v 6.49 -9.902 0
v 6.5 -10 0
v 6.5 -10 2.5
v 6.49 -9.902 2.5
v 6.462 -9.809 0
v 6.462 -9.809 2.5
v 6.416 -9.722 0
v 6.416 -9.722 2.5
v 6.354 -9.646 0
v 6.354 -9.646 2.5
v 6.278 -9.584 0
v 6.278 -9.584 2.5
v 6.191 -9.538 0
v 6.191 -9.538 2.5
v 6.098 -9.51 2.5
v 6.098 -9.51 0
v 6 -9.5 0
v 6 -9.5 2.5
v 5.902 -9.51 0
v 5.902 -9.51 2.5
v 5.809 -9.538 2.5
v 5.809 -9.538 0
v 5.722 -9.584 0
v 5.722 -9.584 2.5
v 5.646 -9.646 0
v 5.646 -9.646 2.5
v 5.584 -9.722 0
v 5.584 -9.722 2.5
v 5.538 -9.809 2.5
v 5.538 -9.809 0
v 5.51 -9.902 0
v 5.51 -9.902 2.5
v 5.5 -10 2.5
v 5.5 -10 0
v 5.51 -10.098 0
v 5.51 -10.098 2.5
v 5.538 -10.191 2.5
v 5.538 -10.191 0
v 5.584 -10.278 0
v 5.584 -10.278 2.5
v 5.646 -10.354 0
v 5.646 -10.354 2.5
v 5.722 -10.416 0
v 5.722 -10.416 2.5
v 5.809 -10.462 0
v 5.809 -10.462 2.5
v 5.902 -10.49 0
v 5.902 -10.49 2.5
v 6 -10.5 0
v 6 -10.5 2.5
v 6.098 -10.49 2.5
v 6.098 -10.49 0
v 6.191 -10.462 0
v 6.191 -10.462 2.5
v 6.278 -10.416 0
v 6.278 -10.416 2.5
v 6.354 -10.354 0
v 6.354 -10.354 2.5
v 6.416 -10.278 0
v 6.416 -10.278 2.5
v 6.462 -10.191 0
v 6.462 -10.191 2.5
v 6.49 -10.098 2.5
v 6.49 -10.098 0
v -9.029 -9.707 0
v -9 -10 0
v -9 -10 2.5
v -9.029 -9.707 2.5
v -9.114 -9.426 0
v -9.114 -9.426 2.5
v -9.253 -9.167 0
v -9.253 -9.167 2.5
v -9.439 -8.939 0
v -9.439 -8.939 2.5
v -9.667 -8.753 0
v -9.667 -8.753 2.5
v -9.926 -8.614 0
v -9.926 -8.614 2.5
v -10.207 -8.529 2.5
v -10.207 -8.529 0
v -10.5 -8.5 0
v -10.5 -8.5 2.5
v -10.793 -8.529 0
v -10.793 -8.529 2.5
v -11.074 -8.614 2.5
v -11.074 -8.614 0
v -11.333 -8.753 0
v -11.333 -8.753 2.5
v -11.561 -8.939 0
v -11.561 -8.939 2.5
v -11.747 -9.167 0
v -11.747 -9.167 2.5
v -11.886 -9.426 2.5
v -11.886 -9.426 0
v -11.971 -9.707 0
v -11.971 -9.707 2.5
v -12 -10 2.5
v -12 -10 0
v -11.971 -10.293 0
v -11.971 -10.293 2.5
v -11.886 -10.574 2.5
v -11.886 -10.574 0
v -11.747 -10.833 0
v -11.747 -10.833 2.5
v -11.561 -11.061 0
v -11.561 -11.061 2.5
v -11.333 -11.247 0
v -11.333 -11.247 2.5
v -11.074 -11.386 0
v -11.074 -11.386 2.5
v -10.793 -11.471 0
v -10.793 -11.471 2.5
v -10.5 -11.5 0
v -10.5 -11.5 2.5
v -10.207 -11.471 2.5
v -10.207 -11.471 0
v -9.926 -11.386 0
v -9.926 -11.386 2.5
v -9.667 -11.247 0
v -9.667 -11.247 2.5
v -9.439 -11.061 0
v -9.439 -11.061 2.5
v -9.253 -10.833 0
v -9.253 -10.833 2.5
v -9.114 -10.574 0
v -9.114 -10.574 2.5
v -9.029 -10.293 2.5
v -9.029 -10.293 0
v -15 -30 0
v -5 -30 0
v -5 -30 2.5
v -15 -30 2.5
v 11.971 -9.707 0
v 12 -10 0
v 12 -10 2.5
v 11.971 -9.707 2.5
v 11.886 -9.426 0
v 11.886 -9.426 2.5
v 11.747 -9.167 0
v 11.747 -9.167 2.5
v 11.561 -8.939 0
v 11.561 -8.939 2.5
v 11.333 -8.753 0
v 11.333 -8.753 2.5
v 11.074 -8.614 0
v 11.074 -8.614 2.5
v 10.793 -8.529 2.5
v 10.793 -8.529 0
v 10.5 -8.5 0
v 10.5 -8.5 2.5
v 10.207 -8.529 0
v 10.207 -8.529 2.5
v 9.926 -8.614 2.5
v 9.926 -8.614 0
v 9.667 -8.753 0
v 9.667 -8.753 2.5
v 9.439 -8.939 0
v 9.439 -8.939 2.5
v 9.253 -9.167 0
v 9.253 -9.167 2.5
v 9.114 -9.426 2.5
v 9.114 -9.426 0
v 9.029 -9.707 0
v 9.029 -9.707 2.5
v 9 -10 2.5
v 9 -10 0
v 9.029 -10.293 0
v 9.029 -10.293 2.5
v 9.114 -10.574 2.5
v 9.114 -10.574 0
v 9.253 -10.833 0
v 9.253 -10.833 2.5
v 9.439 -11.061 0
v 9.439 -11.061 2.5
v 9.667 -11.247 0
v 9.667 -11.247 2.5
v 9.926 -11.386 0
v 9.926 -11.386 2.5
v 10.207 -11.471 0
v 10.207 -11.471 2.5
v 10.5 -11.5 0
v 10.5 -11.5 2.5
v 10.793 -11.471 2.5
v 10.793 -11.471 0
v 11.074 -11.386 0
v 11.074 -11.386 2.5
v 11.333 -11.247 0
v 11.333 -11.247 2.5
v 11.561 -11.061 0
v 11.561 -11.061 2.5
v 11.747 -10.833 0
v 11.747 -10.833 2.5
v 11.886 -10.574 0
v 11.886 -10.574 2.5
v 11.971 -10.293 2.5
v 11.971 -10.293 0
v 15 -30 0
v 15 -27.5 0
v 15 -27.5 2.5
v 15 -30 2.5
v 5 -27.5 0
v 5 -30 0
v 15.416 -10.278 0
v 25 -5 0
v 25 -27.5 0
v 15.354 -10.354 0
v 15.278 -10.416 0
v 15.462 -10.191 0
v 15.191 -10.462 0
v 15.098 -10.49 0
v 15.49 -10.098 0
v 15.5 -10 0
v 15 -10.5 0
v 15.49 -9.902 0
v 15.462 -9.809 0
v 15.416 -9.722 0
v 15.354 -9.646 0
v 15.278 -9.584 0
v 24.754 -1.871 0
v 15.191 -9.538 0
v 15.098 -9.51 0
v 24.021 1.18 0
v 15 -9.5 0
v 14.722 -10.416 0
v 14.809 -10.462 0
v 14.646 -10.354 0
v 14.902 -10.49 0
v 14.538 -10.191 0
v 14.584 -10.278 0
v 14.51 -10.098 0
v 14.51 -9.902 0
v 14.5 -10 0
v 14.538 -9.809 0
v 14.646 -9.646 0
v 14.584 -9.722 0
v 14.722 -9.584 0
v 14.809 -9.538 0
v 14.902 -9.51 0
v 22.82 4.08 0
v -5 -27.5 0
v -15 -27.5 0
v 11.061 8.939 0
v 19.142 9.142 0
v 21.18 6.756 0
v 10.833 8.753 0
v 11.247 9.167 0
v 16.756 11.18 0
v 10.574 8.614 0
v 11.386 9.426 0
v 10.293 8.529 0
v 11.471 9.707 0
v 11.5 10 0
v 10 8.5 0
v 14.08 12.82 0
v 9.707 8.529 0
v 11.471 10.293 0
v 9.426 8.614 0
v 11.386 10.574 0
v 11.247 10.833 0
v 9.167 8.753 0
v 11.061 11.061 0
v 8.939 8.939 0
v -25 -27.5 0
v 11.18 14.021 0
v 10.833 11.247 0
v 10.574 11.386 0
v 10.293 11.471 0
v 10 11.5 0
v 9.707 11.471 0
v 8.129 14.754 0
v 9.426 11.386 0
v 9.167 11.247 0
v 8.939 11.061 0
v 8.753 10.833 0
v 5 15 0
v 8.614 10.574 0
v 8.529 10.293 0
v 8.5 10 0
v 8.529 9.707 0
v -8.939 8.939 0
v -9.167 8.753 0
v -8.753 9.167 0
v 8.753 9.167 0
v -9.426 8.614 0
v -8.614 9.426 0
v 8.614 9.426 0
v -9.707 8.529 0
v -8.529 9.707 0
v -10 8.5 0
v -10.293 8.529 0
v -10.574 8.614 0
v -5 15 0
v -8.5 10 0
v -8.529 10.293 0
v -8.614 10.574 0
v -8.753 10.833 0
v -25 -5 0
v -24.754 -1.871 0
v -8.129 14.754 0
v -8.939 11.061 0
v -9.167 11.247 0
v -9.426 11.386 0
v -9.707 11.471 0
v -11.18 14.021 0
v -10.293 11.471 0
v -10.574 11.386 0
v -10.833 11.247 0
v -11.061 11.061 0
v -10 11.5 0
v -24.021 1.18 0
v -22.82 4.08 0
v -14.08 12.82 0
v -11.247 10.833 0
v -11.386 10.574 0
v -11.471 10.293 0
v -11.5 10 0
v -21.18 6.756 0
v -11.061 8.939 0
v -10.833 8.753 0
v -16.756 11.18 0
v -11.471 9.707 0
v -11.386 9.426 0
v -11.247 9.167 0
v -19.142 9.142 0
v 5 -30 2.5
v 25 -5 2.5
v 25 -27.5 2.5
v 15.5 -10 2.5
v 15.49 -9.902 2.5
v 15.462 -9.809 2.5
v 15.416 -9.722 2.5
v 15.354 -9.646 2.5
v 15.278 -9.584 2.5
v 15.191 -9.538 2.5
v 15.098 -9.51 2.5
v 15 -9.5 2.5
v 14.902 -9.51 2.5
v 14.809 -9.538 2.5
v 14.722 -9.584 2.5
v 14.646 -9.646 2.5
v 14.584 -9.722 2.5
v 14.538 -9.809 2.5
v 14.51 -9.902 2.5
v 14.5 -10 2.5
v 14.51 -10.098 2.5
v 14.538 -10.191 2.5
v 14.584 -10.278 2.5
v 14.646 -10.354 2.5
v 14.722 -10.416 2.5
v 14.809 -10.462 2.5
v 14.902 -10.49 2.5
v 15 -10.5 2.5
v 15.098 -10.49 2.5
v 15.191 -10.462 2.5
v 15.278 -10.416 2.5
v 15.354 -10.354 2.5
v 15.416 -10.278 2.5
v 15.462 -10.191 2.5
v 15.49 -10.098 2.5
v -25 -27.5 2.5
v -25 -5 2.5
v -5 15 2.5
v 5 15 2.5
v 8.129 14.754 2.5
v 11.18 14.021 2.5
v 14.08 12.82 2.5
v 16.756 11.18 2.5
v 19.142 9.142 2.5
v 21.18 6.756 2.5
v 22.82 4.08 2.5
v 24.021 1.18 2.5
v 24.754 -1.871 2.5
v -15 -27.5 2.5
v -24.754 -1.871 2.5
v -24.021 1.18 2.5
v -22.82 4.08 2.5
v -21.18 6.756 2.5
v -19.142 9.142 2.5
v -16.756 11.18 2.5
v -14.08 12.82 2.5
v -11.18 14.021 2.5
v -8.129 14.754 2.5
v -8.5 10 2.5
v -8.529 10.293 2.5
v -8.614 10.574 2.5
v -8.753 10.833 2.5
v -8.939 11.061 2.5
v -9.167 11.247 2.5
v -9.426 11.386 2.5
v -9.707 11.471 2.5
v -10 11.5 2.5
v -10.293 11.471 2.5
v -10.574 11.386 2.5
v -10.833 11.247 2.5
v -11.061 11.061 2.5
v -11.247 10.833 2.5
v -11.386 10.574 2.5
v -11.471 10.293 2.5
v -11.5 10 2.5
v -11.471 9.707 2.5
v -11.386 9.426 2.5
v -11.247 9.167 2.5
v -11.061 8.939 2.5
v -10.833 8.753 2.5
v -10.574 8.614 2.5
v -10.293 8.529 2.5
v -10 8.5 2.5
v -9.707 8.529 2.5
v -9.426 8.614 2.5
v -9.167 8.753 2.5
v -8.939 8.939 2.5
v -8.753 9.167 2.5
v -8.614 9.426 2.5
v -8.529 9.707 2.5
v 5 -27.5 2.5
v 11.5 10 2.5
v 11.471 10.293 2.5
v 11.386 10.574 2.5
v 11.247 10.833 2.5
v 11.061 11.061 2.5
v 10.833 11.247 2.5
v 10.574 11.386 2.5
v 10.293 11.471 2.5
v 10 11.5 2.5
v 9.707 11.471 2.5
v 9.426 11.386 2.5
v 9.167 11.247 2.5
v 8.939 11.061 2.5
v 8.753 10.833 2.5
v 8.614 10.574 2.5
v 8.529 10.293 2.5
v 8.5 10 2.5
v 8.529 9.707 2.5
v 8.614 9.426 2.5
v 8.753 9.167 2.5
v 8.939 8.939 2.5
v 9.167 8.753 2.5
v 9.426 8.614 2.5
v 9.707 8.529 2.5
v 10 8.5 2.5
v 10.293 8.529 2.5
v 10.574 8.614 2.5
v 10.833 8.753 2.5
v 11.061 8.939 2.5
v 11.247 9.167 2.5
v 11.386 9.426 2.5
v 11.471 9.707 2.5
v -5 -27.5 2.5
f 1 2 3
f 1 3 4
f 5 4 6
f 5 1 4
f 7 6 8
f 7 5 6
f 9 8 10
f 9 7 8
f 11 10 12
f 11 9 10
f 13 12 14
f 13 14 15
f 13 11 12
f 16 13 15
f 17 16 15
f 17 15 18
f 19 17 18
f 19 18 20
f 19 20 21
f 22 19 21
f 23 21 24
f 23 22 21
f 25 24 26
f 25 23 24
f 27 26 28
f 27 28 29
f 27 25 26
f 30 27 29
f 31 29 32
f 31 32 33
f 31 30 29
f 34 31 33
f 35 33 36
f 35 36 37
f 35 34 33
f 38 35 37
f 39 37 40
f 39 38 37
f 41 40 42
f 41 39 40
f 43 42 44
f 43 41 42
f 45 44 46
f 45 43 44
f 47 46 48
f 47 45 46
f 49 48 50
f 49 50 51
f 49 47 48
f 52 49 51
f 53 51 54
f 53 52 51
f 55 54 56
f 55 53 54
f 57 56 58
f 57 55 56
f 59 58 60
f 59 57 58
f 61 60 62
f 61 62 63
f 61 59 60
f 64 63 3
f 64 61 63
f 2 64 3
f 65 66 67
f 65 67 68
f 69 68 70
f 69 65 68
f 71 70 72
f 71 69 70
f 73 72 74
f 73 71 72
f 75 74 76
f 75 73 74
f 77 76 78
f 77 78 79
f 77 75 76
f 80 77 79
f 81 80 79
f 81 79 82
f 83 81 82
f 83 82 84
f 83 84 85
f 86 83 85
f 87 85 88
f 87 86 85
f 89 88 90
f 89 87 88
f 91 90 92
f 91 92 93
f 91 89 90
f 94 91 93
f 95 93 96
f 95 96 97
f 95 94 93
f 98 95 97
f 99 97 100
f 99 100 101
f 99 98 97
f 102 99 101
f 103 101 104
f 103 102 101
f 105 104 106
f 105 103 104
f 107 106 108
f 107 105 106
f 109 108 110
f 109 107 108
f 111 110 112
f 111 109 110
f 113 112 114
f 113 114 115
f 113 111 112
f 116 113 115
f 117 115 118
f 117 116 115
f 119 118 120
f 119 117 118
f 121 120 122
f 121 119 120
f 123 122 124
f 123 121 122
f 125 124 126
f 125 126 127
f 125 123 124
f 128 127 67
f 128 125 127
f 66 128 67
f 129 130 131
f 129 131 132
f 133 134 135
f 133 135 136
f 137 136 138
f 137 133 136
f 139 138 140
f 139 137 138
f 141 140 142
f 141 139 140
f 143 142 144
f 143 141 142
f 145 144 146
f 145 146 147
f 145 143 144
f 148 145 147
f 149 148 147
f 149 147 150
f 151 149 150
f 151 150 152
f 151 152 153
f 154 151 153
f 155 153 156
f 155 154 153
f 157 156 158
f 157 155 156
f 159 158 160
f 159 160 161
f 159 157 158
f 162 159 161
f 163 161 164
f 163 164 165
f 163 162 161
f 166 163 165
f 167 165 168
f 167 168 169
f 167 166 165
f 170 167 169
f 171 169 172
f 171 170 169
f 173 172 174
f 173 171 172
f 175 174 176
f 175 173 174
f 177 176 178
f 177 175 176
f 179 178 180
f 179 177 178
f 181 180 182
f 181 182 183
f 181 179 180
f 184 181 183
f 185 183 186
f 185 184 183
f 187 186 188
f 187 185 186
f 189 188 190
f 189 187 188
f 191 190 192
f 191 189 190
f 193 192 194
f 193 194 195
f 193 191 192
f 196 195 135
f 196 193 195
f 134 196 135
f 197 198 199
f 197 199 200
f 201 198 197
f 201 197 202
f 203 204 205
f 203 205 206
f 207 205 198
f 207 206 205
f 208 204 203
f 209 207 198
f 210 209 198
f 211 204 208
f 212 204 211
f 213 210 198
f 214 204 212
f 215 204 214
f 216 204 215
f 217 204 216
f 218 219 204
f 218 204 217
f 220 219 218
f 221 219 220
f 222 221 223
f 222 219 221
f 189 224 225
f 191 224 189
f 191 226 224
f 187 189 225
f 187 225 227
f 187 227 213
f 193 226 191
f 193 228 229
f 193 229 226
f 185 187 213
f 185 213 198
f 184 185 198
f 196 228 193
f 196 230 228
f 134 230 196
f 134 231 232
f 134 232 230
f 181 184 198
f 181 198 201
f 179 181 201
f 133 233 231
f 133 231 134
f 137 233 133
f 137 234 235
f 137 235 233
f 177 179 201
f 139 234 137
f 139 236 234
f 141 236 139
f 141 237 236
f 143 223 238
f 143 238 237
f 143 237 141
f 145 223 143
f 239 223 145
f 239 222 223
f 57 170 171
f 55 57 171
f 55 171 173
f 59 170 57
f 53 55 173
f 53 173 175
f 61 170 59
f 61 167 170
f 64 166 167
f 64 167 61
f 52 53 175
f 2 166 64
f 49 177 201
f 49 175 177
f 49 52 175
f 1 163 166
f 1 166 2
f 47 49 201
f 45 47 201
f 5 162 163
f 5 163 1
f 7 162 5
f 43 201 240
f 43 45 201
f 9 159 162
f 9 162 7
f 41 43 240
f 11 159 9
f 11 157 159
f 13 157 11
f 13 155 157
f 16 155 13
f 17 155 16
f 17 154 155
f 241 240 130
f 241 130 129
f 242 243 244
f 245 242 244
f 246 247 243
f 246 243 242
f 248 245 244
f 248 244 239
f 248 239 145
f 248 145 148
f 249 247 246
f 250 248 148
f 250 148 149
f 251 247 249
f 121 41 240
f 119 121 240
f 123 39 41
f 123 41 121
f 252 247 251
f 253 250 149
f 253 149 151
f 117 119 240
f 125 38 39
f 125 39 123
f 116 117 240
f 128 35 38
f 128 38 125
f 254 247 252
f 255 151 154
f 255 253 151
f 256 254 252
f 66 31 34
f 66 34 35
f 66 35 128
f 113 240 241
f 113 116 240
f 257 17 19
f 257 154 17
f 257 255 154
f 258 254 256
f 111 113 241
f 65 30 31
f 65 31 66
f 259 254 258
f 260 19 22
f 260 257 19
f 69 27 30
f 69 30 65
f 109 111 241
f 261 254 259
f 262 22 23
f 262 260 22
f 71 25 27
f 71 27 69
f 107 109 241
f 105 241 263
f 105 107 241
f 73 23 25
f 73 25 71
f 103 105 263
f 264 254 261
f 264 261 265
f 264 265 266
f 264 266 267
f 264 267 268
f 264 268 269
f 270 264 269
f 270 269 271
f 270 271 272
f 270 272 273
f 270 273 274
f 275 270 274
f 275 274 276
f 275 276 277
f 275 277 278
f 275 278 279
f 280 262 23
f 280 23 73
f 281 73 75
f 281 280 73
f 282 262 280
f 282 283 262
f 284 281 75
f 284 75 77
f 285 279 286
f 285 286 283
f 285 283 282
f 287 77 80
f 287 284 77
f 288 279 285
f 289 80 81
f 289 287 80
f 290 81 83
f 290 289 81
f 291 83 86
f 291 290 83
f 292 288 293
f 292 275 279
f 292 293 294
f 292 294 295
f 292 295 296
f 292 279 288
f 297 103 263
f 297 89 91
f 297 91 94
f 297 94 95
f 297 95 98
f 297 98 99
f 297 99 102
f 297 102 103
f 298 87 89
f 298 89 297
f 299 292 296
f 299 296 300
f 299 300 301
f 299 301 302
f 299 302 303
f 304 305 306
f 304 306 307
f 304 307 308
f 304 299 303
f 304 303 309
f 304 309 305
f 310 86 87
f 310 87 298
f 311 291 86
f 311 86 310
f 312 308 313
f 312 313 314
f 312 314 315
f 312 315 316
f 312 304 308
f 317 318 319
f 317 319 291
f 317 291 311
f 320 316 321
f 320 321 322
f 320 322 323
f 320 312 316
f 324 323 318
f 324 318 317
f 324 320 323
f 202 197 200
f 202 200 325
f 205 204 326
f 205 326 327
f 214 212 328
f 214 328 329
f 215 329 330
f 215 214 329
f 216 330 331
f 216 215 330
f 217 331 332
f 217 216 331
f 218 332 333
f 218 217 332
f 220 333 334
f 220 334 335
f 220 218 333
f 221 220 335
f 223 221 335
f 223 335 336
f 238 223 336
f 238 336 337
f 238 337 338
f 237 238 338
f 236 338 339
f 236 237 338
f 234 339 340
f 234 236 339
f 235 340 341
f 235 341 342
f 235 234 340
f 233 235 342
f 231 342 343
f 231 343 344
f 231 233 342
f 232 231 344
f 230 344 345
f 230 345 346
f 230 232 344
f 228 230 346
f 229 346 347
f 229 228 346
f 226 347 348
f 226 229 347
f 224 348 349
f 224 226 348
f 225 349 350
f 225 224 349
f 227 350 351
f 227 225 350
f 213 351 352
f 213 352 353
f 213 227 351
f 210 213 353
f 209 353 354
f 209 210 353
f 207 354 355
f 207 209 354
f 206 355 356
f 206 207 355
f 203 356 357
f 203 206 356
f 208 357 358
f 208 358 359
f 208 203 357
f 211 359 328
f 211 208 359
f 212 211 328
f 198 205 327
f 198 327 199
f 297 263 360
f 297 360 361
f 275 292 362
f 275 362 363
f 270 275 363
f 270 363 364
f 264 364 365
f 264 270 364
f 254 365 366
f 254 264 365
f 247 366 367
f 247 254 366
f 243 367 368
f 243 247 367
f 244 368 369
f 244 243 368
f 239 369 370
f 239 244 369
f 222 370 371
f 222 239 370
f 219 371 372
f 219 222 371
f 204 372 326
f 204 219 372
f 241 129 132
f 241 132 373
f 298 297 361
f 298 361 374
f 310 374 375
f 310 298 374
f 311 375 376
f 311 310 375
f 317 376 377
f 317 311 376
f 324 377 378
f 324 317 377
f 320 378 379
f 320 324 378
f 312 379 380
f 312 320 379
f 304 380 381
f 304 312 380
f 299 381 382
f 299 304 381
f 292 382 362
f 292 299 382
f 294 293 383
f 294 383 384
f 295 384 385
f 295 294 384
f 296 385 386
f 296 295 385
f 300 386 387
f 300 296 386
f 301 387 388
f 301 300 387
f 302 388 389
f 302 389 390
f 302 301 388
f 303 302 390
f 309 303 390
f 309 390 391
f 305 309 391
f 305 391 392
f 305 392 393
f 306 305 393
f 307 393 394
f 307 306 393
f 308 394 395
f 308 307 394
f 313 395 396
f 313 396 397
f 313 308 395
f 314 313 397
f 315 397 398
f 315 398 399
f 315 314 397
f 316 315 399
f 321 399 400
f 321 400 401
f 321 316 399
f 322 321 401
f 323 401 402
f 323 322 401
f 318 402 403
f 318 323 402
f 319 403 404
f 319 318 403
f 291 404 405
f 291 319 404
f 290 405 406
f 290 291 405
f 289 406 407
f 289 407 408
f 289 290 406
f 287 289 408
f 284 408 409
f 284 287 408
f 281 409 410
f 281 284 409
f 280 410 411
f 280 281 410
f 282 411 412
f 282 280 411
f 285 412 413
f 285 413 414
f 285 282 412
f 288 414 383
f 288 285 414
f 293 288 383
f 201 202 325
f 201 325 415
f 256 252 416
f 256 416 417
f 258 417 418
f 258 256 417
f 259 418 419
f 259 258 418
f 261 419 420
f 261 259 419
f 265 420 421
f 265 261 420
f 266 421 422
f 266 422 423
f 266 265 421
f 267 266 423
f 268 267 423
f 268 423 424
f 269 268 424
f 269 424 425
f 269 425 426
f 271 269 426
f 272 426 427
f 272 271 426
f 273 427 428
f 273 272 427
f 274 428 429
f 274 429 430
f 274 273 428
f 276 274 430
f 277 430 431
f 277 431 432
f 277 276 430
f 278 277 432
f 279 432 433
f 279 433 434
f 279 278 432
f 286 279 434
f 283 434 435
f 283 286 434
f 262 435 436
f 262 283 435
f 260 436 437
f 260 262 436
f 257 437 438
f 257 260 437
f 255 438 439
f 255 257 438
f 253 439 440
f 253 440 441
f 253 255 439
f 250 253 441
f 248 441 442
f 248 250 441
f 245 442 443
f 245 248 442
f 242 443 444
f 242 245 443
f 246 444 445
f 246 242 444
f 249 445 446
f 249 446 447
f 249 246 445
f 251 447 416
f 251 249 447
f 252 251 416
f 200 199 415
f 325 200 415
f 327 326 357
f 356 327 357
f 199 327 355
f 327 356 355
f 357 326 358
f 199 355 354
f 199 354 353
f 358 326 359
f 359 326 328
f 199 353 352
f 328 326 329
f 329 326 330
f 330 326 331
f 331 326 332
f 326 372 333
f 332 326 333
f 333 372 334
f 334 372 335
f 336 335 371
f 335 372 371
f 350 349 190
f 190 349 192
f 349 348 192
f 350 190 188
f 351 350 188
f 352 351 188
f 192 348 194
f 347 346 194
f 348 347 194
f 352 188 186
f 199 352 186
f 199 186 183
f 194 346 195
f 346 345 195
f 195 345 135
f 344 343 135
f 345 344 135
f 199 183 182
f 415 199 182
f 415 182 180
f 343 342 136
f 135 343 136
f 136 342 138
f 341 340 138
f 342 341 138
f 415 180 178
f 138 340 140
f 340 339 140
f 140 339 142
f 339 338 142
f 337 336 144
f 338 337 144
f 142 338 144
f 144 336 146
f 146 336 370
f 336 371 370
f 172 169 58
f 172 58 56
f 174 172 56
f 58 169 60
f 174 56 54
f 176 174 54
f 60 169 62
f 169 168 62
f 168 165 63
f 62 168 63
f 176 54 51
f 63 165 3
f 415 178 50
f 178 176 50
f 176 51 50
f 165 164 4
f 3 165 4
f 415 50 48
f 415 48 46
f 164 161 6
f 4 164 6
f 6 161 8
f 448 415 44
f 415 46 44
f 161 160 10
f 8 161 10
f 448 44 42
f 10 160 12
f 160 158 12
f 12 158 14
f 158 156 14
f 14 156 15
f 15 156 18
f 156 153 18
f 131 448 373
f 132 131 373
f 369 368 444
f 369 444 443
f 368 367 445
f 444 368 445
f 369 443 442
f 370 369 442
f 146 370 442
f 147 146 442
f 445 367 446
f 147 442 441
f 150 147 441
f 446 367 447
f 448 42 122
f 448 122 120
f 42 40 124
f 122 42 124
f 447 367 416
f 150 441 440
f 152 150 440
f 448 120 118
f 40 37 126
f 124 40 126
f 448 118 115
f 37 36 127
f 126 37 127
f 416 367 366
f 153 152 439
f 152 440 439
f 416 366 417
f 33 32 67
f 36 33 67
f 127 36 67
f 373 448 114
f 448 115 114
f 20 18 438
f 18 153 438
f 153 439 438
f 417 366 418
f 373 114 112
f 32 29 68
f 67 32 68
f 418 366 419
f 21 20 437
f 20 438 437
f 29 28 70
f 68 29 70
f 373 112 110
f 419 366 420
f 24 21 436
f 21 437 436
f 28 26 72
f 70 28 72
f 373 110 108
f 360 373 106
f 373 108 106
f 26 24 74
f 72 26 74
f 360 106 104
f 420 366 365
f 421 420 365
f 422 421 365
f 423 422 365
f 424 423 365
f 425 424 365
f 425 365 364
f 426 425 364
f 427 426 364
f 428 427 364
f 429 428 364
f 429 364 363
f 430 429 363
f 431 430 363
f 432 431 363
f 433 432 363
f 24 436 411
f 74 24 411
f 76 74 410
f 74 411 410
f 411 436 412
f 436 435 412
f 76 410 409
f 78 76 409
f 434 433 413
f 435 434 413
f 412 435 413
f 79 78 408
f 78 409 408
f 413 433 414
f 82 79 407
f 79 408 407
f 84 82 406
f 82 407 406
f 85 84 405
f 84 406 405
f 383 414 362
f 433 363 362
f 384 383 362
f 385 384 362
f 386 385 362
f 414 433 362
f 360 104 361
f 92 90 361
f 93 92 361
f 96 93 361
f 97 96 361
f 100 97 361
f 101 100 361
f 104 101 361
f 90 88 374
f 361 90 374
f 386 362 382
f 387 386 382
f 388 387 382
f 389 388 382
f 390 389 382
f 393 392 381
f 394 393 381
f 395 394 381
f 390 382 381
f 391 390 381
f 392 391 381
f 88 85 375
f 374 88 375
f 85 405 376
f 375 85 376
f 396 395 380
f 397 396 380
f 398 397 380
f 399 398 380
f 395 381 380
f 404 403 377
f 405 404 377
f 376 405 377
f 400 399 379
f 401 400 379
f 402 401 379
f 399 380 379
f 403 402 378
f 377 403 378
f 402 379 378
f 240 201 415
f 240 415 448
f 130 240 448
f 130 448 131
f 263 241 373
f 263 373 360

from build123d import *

# Parameters (mm, degrees)
CROQUIS1_R              = 1.5
CROQUIS1_R_2            = 0.5
SALIENTE_EXTRUIR1_DEPTH = 2.5


with BuildPart() as part:
    # Croquis1 → Saliente-Extruir1 (new body)
    with BuildSketch(Plane.XY):
        with BuildLine():
            Line((-25, -15), (-25, -5))
            ThreePointArc((-25, -5), (-19.142135624, 9.142135624), (-5, 15))
            Line((-5, 15), (5, 15))
            ThreePointArc((5, 15), (19.142135624, 9.142135624), (25, -5))
            Line((25, -5), (25, -15))
            Line((25, -15), (25, -27.5))
            Line((25, -27.5), (15, -27.5))
            Line((15, -27.5), (15, -30))
            Line((15, -30), (5, -30))
            Line((5, -30), (5, -27.5))
            Line((5, -27.5), (-5, -27.5))
            Line((-5, -27.5), (-5, -30))
            Line((-5, -30), (-15, -30))
            Line((-15, -30), (-15, -27.5))
            Line((-15, -27.5), (-25, -27.5))
            Line((-25, -27.5), (-25, -15))
        make_face()
        with Locations((-10, 10)):
            Circle(CROQUIS1_R, mode=Mode.SUBTRACT)
        with Locations((10, 10)):
            Circle(CROQUIS1_R, mode=Mode.SUBTRACT)
        with Locations((-10.5, -10)):
            Circle(CROQUIS1_R, mode=Mode.SUBTRACT)
        with Locations((10.5, -10)):
            Circle(CROQUIS1_R, mode=Mode.SUBTRACT)
        with Locations((15, -10)):
            Circle(CROQUIS1_R_2, mode=Mode.SUBTRACT)
        with Locations((6, -10)):
            Circle(CROQUIS1_R_2, mode=Mode.SUBTRACT)
    extrude(amount=SALIENTE_EXTRUIR1_DEPTH)


solid = part.part
